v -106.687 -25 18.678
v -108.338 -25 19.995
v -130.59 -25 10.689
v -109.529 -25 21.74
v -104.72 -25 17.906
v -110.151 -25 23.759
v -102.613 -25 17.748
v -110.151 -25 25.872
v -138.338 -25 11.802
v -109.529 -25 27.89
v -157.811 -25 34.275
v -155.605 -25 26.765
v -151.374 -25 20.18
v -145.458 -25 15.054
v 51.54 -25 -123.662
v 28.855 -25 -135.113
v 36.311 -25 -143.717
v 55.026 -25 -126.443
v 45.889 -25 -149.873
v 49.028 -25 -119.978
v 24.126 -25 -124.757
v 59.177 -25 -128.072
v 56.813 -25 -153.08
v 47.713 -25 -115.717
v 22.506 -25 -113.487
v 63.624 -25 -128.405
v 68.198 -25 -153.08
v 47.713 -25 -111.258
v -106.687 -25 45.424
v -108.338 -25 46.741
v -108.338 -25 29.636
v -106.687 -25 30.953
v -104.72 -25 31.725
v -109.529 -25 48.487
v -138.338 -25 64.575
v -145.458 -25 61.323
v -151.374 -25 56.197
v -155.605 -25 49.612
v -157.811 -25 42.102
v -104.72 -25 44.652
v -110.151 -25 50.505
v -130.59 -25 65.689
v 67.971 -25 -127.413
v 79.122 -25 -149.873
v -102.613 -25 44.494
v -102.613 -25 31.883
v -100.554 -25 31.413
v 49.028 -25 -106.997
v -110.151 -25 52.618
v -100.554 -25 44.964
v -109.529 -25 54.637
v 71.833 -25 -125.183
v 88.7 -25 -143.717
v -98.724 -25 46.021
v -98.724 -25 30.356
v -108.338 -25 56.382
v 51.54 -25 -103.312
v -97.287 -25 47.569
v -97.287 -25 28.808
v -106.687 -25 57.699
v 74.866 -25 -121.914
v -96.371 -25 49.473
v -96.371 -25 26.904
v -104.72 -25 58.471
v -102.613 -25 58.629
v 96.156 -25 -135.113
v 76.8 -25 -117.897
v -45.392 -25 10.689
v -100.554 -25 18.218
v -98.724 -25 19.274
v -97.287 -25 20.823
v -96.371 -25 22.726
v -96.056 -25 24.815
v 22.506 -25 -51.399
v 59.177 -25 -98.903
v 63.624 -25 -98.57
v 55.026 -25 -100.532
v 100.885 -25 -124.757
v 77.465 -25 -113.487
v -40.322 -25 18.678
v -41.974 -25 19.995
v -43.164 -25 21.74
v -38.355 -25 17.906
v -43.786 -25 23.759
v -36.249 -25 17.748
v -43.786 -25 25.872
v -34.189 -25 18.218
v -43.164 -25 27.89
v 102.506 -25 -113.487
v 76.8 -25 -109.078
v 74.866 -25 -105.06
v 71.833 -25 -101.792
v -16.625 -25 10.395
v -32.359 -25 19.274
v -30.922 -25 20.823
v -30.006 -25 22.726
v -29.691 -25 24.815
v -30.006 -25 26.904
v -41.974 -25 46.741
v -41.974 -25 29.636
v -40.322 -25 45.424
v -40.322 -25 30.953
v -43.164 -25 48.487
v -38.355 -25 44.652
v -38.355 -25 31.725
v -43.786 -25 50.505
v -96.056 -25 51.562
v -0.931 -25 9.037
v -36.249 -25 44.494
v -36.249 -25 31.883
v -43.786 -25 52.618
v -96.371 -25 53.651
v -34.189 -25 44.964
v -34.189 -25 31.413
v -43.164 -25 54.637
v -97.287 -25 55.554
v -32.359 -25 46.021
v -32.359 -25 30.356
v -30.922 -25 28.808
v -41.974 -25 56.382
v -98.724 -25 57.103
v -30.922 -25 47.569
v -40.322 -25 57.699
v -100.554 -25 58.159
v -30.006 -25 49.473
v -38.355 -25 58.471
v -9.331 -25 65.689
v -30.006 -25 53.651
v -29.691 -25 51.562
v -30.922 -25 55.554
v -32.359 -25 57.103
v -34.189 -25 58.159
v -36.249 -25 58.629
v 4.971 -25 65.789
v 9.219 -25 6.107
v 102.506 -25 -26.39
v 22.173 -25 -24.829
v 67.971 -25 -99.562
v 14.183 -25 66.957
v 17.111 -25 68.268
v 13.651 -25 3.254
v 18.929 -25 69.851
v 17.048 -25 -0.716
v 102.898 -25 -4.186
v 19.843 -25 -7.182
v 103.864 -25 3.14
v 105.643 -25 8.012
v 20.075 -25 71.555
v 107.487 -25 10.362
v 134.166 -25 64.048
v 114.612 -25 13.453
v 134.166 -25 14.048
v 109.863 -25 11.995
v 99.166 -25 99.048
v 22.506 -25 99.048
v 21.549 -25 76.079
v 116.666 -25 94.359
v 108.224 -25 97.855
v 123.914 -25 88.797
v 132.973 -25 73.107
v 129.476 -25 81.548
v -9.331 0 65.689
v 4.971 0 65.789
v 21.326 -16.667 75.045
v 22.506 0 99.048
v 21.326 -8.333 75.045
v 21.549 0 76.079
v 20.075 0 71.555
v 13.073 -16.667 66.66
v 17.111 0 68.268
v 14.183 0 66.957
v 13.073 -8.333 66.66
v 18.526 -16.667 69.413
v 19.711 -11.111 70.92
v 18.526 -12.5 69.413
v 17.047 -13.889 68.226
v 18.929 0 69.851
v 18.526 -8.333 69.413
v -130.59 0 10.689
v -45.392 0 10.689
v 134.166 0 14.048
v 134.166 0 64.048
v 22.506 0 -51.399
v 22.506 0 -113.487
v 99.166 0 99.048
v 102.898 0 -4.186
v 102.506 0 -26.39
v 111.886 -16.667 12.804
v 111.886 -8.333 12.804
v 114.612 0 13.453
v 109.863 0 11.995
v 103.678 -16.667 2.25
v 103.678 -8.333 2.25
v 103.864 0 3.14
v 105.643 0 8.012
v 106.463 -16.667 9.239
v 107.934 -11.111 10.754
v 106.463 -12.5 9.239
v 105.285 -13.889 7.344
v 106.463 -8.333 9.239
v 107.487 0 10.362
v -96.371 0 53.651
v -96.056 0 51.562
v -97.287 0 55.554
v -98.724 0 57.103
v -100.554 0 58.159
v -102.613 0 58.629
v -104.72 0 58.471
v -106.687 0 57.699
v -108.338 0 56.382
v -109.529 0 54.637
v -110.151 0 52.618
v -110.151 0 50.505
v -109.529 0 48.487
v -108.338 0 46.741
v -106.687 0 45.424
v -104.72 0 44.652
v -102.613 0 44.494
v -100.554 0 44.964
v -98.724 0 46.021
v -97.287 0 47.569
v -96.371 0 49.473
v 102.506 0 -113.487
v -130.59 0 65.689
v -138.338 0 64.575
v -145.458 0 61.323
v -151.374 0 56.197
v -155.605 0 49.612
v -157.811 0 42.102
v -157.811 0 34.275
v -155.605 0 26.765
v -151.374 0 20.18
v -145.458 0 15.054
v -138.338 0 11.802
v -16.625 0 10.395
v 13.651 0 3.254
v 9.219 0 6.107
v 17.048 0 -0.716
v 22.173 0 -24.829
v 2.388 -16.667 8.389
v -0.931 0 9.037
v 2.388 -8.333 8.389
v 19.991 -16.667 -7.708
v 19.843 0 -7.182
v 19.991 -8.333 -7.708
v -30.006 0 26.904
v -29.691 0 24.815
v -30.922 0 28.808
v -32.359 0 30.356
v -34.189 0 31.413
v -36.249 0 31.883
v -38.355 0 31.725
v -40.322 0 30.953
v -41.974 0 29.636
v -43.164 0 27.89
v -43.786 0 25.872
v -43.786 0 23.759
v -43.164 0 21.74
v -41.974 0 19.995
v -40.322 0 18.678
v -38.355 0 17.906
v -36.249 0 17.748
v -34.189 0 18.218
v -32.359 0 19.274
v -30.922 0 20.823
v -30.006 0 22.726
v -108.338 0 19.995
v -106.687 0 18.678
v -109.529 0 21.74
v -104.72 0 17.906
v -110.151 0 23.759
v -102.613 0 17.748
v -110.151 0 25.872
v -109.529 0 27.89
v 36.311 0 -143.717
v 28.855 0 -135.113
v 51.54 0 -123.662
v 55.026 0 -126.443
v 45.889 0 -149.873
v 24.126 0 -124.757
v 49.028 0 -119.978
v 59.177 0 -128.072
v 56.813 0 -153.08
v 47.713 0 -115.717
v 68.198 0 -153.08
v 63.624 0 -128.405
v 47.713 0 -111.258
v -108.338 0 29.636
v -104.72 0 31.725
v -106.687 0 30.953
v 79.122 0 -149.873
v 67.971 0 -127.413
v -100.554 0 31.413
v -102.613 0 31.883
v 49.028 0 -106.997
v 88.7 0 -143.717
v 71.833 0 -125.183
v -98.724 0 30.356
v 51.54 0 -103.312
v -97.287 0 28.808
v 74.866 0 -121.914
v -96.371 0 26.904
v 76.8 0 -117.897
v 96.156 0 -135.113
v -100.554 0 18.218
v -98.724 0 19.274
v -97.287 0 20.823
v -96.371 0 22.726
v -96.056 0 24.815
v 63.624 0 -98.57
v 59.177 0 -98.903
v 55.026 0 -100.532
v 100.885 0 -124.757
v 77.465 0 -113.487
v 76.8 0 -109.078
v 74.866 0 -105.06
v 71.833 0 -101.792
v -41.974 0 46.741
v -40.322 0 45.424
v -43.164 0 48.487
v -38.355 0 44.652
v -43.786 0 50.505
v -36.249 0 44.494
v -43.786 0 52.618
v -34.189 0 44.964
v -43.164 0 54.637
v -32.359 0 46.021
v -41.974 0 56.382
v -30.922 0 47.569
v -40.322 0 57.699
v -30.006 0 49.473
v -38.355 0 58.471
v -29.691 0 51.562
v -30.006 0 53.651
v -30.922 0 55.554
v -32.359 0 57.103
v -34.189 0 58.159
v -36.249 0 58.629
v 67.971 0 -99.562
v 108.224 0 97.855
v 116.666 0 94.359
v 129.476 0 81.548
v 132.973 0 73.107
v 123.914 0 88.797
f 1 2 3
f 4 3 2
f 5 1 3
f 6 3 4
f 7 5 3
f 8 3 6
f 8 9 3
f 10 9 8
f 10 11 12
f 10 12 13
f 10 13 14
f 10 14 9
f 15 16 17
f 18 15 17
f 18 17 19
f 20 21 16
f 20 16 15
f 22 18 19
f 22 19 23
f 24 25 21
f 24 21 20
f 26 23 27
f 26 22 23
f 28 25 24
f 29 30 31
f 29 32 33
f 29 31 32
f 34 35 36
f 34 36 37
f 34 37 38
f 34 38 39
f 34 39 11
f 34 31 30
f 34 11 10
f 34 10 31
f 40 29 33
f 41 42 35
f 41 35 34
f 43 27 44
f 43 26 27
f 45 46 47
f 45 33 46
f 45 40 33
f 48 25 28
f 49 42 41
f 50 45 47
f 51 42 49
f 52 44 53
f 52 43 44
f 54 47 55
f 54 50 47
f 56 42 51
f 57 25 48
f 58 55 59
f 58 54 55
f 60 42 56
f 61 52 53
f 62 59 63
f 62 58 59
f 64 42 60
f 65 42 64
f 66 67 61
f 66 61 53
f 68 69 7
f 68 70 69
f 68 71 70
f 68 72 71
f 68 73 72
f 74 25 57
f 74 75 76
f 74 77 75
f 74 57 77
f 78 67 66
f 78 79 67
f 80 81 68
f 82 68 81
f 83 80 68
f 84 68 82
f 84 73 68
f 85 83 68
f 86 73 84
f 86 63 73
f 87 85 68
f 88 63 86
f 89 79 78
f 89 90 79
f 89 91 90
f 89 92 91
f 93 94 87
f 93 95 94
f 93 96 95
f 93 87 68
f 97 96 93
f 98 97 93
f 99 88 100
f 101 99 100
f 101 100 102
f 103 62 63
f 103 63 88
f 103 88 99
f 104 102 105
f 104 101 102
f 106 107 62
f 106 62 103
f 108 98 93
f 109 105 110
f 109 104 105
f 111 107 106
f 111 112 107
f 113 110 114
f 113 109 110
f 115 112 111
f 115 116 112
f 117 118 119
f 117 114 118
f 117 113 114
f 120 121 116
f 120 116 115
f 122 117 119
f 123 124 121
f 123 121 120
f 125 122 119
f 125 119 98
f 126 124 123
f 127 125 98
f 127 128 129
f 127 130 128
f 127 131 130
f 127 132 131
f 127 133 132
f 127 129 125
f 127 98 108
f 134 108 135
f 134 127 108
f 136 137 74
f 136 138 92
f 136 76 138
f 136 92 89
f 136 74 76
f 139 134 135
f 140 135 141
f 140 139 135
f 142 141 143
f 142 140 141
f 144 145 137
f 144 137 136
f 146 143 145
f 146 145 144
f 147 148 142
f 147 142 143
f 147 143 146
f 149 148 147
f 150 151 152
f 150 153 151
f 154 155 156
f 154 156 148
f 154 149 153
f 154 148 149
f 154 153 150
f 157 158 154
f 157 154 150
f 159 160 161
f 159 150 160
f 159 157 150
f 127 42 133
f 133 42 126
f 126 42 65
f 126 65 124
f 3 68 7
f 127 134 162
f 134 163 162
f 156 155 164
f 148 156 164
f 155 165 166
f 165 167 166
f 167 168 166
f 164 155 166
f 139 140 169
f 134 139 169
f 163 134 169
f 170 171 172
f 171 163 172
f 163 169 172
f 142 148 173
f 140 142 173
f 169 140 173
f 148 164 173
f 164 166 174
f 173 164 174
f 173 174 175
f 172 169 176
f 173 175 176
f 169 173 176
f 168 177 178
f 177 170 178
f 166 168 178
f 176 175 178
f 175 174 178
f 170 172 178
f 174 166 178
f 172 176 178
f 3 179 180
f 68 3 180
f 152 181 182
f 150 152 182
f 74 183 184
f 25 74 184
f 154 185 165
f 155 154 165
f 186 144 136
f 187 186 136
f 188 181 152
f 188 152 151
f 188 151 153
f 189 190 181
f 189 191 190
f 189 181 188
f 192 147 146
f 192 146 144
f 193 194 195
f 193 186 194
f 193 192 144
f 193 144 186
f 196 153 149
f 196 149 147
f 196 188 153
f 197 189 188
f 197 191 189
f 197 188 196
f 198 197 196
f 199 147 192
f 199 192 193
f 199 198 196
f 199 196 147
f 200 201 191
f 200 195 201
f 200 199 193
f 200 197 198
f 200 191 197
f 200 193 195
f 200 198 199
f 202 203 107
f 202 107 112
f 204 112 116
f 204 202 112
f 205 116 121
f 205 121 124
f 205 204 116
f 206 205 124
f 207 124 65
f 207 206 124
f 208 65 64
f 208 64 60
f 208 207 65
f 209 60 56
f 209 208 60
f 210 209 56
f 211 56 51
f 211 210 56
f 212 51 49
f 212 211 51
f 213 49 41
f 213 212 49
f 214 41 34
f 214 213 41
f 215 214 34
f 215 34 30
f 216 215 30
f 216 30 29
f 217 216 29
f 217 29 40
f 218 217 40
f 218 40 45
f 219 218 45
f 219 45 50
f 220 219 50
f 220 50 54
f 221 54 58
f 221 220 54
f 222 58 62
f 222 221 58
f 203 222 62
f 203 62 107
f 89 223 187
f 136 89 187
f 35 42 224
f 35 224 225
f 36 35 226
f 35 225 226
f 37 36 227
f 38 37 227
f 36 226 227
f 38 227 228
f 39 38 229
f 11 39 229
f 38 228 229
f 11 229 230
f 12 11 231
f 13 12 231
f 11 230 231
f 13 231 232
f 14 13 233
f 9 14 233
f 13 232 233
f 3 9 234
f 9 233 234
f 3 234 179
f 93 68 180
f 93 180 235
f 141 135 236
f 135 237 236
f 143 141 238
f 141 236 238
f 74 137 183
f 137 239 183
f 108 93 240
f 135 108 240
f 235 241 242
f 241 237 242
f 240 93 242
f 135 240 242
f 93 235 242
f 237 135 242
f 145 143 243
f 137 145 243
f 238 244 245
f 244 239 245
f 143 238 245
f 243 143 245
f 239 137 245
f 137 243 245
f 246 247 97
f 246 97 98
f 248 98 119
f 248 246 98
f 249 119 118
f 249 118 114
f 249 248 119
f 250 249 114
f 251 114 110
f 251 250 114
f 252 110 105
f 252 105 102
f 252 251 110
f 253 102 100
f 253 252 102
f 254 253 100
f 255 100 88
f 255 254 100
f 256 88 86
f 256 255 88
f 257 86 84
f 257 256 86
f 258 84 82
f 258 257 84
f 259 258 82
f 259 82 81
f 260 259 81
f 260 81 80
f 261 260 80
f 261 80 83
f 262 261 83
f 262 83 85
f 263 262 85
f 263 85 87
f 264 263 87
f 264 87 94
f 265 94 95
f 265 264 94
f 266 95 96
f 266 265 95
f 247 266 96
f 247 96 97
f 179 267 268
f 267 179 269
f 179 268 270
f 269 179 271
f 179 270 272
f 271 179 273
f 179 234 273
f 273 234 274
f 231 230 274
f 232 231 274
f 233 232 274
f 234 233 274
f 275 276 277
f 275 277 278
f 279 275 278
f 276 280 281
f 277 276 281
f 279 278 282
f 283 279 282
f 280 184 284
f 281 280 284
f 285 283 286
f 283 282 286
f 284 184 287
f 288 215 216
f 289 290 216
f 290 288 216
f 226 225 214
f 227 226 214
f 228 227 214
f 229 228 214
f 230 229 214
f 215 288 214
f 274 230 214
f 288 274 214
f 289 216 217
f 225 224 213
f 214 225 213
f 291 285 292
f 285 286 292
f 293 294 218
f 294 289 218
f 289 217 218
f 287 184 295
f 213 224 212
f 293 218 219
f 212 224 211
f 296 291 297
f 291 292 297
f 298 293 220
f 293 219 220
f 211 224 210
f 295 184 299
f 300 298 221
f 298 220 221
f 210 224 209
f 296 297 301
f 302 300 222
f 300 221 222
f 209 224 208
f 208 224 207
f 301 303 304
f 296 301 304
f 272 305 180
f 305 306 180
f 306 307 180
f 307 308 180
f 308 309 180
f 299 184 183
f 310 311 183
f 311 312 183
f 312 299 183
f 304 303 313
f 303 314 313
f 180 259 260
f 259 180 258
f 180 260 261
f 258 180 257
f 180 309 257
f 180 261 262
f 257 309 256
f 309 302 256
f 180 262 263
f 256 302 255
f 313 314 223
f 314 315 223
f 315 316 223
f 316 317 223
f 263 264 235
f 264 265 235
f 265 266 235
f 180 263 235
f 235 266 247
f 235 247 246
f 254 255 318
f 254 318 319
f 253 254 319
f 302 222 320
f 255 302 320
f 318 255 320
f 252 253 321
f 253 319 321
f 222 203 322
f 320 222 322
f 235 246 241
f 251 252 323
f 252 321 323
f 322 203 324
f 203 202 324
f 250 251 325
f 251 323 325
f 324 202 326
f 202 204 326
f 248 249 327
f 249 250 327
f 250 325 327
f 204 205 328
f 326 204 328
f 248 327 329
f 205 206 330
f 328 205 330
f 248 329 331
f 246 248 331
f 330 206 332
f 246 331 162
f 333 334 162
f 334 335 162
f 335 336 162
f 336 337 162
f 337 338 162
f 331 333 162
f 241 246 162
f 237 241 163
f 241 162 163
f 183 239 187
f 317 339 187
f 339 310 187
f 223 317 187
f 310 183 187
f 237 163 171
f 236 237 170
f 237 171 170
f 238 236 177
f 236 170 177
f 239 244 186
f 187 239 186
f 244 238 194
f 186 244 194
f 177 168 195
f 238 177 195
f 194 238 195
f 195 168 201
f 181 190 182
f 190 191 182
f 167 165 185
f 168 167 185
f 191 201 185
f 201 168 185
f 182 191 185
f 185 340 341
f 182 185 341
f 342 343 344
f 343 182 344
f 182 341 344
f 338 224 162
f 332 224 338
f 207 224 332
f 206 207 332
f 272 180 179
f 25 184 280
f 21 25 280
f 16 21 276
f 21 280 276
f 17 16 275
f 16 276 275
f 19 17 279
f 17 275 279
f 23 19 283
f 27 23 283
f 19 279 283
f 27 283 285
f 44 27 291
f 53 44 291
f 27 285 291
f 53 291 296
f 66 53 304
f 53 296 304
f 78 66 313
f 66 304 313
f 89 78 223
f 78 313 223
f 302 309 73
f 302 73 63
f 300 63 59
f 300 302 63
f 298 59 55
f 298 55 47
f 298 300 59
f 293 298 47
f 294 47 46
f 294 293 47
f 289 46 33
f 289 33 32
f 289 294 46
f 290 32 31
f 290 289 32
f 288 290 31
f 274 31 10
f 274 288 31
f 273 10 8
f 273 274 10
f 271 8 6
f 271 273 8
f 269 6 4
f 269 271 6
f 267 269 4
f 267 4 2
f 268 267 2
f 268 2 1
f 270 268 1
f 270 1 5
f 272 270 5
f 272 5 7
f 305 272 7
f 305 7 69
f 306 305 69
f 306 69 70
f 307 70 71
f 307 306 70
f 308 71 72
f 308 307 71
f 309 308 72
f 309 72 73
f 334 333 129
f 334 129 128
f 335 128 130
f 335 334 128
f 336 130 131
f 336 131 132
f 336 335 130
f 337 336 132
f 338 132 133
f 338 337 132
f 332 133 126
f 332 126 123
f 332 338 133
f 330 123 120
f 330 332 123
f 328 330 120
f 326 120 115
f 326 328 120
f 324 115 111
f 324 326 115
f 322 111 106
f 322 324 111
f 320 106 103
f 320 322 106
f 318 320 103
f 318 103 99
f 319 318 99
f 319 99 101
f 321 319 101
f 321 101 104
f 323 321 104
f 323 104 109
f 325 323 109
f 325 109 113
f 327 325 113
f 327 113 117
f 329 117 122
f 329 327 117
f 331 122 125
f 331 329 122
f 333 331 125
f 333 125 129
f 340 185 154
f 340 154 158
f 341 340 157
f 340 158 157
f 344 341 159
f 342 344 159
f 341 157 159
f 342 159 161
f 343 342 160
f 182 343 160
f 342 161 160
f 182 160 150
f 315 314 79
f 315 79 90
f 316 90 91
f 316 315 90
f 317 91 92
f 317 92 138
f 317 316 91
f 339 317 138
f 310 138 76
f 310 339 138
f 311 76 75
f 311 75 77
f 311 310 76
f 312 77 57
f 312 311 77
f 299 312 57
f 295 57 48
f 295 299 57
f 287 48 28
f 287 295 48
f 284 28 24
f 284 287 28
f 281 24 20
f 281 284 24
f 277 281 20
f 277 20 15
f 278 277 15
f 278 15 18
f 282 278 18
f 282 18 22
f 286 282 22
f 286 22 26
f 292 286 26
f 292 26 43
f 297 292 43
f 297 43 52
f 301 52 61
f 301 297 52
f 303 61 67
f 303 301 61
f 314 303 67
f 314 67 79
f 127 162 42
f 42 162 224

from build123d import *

# Parameters (mm, degrees)
F0_R     = 14.959445
F0_R_2   = 7.087313
F1_DEPTH = 25
F2_R     = 35


with BuildPart() as f1:
    # F0 (on Front) → F1 (new body)
    with BuildSketch(Plane.XZ):
        with BuildLine():
            add(Edge.make_bspline(
                [(-45.392299, 10.688528), (22.505625, 10.688528), (22.505625, 10.688528), (22.505625, -51.399426)],
                knots=[0, 0, 0, 0, 92.005663, 92.005663, 92.005663, 92.005663], degree=3))
            Line((22.505625, -51.399426), (22.505625, -113.487379))
            ThreePointArc((22.505625, -113.487379), (62.505625, -153.487379), (102.505625, -113.487379))
            Line((102.505625, -113.487379), (102.505625, -26.389777))
            add(Edge.make_bspline(
                [(134.16557, 14.047909), (102.505625, 14.534711), (102.505625, 14.216591), (102.505625, -26.389777)],
                knots=[0, 0, 0, 0, 51.357167, 51.357167, 51.357167, 51.357167], degree=3))
            Line((134.16557, 14.047909), (134.16557, 99.047909))
            Line((134.16557, 99.047909), (22.505625, 99.047909))
            add(Edge.make_bspline(
                [(22.505625, 99.047909), (22.505625, 64.501319), (22.505625, 65.688528), (-9.330841, 65.688528)],
                knots=[0, 0, 0, 0, 46.113002, 46.113002, 46.113002, 46.113002], degree=3))
            Line((-9.330841, 65.688528), (-130.590424, 65.688528))
            ThreePointArc((-130.590424, 65.688528), (-158.090424, 38.188528), (-130.590424, 10.688528))
            Line((-130.590424, 10.688528), (-45.392299, 10.688528))
        make_face()
        with Locations((62.505625, -113.487379)):
            Circle(F0_R, mode=Mode.SUBTRACT)
        with Locations((-103.143071, 24.815377)):
            Circle(F0_R_2, mode=Mode.SUBTRACT)
        with Locations((-36.778194, 24.815377)):
            Circle(F0_R_2, mode=Mode.SUBTRACT)
        with Locations((-103.143071, 51.561678)):
            Circle(F0_R_2, mode=Mode.SUBTRACT)
        with Locations((-36.778194, 51.561678)):
            Circle(F0_R_2, mode=Mode.SUBTRACT)
    extrude(amount=F1_DEPTH)

    # F2
    f2_edges = [f1.edges().sort_by_distance(p)[0] for p in [
        (134.16557, -12.5, 99.047909),
    ]]
    fillet(f2_edges, radius=F2_R)


solid = f1.part
